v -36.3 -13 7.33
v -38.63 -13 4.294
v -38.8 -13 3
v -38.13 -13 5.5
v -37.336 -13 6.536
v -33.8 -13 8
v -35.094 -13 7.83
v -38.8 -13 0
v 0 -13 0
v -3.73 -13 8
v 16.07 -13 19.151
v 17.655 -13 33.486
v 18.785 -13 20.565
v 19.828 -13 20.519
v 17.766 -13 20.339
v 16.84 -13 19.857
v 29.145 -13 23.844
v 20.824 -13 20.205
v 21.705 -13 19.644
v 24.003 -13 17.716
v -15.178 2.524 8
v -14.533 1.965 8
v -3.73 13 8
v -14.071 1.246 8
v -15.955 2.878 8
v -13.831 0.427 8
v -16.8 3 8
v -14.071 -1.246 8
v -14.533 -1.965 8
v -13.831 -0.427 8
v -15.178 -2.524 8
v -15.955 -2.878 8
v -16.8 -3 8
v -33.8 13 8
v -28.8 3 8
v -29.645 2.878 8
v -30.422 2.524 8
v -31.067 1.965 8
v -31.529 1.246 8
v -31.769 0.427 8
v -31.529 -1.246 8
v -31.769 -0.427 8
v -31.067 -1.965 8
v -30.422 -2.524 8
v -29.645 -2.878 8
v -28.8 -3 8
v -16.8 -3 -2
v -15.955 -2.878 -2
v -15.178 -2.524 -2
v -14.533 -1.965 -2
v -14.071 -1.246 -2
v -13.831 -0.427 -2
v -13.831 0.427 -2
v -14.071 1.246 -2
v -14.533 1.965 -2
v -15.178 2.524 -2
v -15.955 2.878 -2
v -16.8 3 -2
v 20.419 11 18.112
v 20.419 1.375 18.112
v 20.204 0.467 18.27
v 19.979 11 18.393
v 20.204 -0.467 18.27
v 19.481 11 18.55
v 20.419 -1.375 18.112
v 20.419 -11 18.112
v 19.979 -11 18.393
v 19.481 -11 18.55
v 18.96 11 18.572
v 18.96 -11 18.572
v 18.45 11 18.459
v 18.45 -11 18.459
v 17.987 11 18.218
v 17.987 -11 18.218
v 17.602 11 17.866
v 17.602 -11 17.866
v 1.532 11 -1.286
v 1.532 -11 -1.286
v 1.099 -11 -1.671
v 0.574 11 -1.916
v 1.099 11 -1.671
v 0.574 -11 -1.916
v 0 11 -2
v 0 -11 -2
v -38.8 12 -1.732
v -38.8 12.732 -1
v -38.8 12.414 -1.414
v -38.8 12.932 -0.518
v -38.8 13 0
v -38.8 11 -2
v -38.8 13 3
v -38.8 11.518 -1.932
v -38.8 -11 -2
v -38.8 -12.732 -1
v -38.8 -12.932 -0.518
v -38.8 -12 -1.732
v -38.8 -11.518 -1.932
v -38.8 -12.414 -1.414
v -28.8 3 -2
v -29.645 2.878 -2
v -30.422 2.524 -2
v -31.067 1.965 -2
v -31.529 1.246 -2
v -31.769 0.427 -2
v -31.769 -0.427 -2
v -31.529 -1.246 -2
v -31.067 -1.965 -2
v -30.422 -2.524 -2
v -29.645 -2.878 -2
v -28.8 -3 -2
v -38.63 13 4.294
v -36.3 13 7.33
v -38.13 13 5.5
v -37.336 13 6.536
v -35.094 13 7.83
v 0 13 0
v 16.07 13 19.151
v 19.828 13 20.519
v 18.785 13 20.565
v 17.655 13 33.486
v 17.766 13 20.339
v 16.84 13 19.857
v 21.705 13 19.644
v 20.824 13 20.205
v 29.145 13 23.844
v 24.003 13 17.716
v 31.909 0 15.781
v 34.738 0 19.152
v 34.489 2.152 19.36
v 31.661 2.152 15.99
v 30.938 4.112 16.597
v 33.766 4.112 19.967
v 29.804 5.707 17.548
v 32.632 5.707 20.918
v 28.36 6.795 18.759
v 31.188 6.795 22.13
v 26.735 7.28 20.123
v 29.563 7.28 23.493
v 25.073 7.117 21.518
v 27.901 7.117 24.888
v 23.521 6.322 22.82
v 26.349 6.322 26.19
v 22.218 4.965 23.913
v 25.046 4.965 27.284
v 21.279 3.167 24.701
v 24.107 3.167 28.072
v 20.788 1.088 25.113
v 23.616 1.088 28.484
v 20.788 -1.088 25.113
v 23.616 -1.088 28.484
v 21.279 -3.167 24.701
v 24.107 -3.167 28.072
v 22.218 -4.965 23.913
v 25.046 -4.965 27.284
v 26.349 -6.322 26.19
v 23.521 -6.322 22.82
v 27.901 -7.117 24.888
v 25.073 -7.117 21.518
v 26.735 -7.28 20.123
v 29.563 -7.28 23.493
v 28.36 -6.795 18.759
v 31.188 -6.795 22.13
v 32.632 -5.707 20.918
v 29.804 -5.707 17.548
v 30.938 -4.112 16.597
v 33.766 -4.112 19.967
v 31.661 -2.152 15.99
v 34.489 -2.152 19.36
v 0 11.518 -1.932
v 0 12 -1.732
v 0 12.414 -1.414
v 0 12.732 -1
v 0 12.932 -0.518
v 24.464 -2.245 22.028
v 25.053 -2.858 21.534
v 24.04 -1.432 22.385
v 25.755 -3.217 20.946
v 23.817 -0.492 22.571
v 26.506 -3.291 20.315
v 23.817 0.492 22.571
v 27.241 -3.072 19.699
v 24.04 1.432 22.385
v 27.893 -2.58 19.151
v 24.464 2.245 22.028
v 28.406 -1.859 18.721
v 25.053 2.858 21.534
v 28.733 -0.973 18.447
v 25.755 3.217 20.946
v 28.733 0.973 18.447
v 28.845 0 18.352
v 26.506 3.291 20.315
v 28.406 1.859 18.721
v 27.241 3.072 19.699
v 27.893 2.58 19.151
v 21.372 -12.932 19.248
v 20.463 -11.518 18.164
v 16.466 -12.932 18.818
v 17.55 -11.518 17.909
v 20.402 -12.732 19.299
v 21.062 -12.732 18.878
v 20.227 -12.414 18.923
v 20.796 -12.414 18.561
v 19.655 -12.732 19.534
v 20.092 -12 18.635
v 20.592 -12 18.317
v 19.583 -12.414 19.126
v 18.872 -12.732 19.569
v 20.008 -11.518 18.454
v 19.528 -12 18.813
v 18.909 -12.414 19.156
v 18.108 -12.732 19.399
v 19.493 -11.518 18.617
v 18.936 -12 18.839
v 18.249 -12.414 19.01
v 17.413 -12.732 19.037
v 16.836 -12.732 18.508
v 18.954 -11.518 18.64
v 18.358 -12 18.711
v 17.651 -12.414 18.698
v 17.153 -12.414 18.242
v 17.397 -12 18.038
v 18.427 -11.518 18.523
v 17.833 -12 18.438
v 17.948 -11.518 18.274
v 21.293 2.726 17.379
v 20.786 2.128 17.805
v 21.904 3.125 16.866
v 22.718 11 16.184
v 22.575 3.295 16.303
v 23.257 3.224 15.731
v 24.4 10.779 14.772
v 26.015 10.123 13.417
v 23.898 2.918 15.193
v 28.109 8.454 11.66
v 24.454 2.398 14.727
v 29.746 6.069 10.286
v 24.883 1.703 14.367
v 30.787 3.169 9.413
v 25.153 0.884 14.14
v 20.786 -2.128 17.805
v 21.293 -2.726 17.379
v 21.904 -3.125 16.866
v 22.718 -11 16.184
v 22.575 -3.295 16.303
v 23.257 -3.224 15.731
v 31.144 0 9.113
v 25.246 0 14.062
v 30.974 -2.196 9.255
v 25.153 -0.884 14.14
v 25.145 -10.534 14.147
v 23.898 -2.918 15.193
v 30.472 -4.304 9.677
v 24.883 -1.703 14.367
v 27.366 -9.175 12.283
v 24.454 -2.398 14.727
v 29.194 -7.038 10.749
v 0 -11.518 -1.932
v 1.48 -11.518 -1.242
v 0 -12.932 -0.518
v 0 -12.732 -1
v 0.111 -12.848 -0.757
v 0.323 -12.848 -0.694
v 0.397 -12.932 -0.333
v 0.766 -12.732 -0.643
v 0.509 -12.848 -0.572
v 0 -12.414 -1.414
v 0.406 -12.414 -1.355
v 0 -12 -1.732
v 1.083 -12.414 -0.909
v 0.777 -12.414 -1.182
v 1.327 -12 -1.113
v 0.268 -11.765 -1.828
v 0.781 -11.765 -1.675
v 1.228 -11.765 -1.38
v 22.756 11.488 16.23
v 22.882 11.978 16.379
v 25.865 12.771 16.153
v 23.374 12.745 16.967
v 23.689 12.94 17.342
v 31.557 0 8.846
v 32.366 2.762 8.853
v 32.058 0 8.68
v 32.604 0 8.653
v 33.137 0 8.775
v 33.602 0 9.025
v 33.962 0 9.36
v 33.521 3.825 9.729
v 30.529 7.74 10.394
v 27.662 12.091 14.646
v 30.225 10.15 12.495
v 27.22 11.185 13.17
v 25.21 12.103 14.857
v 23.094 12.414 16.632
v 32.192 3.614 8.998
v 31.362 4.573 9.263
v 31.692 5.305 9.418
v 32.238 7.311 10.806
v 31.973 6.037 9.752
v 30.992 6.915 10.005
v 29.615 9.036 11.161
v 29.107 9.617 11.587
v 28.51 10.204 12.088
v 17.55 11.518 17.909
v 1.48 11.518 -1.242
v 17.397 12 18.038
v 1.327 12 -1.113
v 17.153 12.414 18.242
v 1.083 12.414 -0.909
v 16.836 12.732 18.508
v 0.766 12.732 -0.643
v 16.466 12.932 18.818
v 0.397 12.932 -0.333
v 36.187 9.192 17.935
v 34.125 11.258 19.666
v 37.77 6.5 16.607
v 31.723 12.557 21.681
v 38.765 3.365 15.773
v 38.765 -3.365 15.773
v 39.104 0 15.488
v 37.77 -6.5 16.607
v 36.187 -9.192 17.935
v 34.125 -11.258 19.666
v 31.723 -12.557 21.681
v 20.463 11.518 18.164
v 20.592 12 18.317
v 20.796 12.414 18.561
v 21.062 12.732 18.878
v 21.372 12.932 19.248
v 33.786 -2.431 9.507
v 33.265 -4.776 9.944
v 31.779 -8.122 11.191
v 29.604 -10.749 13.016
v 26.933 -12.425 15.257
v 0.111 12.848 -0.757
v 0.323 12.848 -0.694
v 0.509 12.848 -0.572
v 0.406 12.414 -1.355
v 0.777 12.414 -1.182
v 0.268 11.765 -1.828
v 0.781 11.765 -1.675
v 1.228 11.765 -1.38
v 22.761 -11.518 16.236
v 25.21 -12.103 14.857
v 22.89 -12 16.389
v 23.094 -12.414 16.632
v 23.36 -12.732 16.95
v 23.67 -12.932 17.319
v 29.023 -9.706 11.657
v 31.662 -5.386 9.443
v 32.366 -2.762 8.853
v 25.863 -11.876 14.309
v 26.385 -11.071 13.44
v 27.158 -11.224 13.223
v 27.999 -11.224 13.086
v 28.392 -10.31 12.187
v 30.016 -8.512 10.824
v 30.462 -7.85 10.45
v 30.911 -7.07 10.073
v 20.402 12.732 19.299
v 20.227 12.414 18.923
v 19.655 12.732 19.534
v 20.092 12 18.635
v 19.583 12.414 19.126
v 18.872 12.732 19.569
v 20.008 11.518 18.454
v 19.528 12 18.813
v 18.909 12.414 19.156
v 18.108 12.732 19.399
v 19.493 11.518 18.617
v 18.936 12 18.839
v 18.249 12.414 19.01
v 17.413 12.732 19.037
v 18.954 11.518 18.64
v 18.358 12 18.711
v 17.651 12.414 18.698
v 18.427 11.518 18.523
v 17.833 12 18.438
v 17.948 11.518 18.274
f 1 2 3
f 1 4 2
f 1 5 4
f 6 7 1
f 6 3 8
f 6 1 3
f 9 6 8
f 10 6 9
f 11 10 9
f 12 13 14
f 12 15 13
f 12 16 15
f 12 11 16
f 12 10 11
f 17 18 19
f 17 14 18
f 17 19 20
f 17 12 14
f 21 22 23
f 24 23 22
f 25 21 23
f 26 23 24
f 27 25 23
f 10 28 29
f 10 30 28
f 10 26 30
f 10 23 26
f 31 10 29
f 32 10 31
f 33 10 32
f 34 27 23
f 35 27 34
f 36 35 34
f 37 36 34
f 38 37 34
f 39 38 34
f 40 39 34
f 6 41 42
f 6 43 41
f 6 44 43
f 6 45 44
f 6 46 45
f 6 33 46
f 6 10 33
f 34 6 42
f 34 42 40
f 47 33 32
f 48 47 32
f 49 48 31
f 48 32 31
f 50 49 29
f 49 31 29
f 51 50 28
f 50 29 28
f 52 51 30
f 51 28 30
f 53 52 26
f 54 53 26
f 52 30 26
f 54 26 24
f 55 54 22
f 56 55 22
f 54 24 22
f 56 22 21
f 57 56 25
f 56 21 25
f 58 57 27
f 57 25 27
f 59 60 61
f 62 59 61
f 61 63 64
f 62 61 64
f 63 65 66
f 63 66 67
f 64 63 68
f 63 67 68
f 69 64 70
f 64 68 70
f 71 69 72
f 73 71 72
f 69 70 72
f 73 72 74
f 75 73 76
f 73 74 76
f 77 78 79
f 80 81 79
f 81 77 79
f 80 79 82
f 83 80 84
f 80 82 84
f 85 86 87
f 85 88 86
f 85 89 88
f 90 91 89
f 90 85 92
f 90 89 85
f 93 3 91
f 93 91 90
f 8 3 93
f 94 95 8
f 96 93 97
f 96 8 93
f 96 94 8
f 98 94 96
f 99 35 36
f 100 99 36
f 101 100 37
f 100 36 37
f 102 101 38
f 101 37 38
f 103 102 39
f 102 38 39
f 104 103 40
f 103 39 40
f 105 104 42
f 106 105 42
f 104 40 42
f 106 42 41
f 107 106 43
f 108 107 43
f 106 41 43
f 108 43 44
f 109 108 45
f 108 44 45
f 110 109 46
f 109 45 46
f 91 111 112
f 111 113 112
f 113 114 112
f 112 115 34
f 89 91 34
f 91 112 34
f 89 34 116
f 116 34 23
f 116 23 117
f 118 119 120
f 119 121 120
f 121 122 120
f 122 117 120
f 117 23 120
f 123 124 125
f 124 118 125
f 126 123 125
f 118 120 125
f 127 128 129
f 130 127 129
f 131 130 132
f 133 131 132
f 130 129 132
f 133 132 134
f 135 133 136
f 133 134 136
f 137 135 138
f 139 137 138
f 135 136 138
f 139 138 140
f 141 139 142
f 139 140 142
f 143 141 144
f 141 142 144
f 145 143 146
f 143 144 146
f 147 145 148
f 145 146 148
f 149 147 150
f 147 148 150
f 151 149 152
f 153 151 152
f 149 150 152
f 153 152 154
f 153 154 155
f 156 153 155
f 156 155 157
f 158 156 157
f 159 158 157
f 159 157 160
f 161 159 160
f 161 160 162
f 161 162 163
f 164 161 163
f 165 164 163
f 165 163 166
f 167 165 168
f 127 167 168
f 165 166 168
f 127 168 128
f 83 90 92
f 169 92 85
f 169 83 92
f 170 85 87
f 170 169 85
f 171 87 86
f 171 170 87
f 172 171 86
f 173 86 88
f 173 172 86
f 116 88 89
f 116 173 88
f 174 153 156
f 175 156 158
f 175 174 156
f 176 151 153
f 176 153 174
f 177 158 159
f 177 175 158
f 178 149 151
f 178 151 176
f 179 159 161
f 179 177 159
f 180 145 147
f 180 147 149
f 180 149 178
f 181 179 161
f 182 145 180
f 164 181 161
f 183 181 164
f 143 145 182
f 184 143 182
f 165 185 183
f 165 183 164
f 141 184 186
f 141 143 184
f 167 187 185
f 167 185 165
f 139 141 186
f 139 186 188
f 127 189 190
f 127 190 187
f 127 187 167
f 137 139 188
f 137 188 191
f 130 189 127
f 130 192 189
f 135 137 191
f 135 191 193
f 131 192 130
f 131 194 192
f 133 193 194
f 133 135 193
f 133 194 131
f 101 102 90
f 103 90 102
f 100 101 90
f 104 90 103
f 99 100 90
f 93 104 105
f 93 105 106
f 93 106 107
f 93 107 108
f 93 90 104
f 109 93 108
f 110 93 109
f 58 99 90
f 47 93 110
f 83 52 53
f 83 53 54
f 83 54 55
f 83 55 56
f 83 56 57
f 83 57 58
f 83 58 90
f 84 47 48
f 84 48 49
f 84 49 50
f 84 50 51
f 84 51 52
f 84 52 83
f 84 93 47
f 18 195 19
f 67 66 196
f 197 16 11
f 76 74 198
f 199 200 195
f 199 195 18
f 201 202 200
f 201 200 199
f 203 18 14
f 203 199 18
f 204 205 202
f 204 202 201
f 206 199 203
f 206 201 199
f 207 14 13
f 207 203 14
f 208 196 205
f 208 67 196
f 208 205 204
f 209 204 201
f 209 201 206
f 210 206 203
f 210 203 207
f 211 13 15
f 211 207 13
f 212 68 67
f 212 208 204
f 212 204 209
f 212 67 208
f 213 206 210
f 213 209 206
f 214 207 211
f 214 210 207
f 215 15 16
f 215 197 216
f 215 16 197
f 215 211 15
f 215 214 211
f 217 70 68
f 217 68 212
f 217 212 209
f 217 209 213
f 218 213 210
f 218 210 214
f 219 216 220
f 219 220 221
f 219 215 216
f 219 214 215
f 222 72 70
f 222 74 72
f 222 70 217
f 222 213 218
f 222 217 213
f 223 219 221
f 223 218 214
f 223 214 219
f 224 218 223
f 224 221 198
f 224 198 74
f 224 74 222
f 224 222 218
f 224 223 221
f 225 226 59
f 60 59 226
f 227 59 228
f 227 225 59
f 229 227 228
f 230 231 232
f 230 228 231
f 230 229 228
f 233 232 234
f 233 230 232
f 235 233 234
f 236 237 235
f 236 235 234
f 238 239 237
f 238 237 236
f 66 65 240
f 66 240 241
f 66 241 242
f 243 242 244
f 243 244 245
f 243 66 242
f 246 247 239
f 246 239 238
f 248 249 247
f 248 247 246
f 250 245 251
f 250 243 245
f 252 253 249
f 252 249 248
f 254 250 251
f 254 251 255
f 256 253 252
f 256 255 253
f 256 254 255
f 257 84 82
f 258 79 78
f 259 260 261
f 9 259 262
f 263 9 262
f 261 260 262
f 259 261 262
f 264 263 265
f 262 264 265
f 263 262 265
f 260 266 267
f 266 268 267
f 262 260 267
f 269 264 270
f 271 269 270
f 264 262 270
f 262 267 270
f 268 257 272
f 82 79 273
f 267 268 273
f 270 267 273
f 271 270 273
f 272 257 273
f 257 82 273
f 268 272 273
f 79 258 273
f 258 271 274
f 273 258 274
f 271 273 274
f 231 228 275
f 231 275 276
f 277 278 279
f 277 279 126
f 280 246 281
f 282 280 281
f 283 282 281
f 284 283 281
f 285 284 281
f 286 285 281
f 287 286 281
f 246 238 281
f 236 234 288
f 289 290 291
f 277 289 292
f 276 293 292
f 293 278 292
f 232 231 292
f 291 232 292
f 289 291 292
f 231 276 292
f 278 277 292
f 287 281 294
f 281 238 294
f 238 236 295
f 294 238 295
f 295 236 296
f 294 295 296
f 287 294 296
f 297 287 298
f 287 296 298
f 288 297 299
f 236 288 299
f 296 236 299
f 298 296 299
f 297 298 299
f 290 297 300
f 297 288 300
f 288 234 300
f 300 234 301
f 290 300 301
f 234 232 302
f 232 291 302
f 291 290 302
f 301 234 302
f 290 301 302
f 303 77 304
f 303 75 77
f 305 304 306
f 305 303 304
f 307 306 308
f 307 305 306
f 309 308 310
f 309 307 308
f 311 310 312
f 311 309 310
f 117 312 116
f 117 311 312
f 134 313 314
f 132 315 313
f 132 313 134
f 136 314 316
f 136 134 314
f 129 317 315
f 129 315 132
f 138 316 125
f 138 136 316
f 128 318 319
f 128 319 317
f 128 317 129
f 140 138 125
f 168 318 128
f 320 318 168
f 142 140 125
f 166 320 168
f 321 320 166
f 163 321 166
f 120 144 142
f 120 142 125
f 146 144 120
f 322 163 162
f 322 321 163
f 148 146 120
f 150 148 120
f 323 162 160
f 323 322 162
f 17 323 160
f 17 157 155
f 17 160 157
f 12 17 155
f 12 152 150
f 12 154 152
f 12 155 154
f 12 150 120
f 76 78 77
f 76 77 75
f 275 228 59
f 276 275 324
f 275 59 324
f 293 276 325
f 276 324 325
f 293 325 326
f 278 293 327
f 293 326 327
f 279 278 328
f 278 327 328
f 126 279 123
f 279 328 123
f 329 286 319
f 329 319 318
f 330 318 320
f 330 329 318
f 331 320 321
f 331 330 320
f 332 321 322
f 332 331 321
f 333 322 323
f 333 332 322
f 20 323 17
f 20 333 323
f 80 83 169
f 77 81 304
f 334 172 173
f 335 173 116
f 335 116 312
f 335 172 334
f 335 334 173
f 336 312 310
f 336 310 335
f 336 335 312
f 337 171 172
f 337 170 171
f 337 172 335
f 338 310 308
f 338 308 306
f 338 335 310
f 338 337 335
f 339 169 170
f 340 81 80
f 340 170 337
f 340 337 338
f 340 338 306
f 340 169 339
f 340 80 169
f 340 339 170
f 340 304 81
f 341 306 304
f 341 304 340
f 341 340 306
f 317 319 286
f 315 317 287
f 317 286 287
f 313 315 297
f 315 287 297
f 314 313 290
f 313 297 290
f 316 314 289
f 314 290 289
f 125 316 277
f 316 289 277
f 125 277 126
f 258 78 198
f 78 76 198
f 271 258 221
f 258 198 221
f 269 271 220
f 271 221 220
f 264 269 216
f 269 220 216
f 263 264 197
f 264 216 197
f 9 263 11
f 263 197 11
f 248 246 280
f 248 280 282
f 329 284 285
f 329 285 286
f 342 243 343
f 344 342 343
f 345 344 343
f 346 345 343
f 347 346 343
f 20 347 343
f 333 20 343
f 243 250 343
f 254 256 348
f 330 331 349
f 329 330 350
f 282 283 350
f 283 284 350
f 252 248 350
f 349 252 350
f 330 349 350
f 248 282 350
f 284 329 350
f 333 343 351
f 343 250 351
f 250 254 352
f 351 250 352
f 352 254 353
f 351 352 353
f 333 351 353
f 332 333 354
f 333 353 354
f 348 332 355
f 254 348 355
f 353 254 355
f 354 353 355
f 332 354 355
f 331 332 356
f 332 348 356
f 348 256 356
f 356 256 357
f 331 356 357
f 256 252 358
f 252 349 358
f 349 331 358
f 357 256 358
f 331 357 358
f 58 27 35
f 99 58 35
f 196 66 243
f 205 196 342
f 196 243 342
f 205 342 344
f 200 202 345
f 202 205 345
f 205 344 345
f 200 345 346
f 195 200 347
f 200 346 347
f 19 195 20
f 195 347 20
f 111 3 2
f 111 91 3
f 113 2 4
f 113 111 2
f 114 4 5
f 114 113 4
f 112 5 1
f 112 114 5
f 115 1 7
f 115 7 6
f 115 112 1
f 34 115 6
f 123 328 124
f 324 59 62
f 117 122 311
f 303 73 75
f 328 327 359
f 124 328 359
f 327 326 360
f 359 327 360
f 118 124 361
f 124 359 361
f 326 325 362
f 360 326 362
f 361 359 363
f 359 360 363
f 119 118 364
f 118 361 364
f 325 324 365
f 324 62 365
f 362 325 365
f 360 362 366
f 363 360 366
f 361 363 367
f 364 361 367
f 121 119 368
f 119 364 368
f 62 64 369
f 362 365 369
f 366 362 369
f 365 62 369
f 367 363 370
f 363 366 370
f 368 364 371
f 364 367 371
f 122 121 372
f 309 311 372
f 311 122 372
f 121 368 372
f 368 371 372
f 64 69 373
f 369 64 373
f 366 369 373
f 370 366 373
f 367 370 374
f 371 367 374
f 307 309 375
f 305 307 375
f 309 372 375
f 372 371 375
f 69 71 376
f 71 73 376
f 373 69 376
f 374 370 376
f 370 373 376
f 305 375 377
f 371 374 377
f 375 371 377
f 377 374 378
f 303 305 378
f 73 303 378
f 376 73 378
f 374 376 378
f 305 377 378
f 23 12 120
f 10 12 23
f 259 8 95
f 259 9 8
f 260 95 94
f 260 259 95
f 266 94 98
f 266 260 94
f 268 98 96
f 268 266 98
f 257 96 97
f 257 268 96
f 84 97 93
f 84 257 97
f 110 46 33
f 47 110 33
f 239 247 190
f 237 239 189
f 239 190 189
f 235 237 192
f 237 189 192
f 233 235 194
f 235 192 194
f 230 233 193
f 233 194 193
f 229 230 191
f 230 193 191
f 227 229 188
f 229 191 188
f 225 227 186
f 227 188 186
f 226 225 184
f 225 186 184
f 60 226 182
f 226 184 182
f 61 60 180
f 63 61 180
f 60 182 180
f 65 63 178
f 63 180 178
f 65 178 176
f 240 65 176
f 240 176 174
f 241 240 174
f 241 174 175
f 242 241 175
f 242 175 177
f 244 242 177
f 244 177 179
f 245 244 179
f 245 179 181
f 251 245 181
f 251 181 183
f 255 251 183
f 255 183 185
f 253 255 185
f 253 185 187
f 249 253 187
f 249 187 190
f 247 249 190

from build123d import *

# Parameters (mm, degrees)
F1_DEPTH    = 13
F2_T1_DEPTH = 75
F3_R        = 2
F4_R        = 7.3
F5_DEPTH    = 4.4
F6_R        = 3.3
F7_DEPTH    = 59.0732481421
F9_DEPTH    = 10.001
F10_R       = 5


# Not quite as in the source:
# - a fillet or chamfer that OpenCascade refuses, or shapes differently, is made with other operations: its cross-section is extruded or revolved along the edge and cut away or added


with BuildPart() as f1:
    # F0 (on Front) → F1 (new body, symmetric)
    with BuildSketch(Plane.XZ):
        Polygon((-38.8, 8), (-38.8, 0), (0, 0), (18.6408406809, 22.2152888505), (33.9617295433, 9.3595366567), (39.1040304208, 15.4878922017), (17.6547860135, 33.4859452729), (-3.7304612652, 8), align=None)
        Polygon((0, 0), (-38.8, 0), (-38.8, -2), (0.9326153163, -2), (18.8873543478, 19.3976247448), (32.6761543239, 7.8274477705), (33.9617295433, 9.3595366567), (18.6408406809, 22.2152888505), align=None)
    extrude(amount=F1_DEPTH, both=True)

    # F2: fillet of radius 13 on 2 edges, made by hand

    # F2_s2 → F2_t1 (cut)
    with BuildSketch(Plane(origin=(-3.5353318533, 0, -4.2132444372), x_dir=(0, 1, 0), z_dir=(0.6427876097, 0, 0.7660444431))):
        with BuildLine():
            ThreePointArc((0, -20), (-9.1923881554, -16.1923881554), (-13, -7))
            Line((-13, -7), (-13, -20))
            Line((-13, -20), (0, -20))
        make_face()
        with BuildLine():
            ThreePointArc((0, -20), (9.1923881554, -16.1923881554), (13, -7))
            Line((13, -7), (13, -20))
            Line((13, -20), (0, -20))
        make_face()
    extrude(amount=F2_T1_DEPTH, mode=Mode.SUBTRACT)

    # F3
    f3_edges = [f1.edges().sort_by_distance(p)[0] for p in [
        (18.887354, 0, 19.397625),
        (20.802465, -13, 17.790656),
        (29.759354, -9.192388, 10.274933),
        (29.759354, 9.192388, 10.274933),
        (20.802465, 13, 17.790656),
        (0.932615, 0, -2),
        (-18.933692, -13, -2),
        (-18.933692, 13, -2),
        (9.909985, 13, 8.698812),
        (9.909985, -13, 8.698812),
    ]]
    fillet(f3_edges, radius=F3_R)

    # F4 (on face) → F5 (cut)
    with BuildSketch(Plane(origin=(23.7831415584, 0, 28.3436443954), x_dir=(0.7660444431, 0, -0.6427876097), z_dir=(0.6427876097, 0, 0.7660444431))):
        with Locations((7, 0)):
            Circle(F4_R)
    extrude(amount=-F5_DEPTH, mode=Mode.SUBTRACT)

    # F6 (on face) → F7 (cut, through all)
    with BuildSketch(Plane(origin=(20.9548760758, 0, 24.9730488457), x_dir=(0.7660444431, 0, -0.6427876097), z_dir=(0.6427876097, 0, 0.7660444431))):
        with Locations((7, 0)):
            Circle(F6_R)
    extrude(amount=-F7_DEPTH, mode=Mode.SUBTRACT)

    # F8 (on face) → F9 (cut, through all)
    with BuildSketch(Plane.XY.offset(8)):
        with BuildLine():
            ThreePointArc((-28.8, 3), (-31.8, 0), (-28.8, -3))
            Line((-28.8, -3), (-16.8, -3))
            ThreePointArc((-16.8, -3), (-13.8, 0), (-16.8, 3))
            Line((-16.8, 3), (-28.8, 3))
        make_face()
    extrude(amount=-F9_DEPTH, mode=Mode.SUBTRACT)

    # F10
    f10_edges = [f1.edges().sort_by_distance(p)[0] for p in [
        (-38.8, 0, 8),
    ]]
    fillet(f10_edges, radius=F10_R)


solid = f1.part
